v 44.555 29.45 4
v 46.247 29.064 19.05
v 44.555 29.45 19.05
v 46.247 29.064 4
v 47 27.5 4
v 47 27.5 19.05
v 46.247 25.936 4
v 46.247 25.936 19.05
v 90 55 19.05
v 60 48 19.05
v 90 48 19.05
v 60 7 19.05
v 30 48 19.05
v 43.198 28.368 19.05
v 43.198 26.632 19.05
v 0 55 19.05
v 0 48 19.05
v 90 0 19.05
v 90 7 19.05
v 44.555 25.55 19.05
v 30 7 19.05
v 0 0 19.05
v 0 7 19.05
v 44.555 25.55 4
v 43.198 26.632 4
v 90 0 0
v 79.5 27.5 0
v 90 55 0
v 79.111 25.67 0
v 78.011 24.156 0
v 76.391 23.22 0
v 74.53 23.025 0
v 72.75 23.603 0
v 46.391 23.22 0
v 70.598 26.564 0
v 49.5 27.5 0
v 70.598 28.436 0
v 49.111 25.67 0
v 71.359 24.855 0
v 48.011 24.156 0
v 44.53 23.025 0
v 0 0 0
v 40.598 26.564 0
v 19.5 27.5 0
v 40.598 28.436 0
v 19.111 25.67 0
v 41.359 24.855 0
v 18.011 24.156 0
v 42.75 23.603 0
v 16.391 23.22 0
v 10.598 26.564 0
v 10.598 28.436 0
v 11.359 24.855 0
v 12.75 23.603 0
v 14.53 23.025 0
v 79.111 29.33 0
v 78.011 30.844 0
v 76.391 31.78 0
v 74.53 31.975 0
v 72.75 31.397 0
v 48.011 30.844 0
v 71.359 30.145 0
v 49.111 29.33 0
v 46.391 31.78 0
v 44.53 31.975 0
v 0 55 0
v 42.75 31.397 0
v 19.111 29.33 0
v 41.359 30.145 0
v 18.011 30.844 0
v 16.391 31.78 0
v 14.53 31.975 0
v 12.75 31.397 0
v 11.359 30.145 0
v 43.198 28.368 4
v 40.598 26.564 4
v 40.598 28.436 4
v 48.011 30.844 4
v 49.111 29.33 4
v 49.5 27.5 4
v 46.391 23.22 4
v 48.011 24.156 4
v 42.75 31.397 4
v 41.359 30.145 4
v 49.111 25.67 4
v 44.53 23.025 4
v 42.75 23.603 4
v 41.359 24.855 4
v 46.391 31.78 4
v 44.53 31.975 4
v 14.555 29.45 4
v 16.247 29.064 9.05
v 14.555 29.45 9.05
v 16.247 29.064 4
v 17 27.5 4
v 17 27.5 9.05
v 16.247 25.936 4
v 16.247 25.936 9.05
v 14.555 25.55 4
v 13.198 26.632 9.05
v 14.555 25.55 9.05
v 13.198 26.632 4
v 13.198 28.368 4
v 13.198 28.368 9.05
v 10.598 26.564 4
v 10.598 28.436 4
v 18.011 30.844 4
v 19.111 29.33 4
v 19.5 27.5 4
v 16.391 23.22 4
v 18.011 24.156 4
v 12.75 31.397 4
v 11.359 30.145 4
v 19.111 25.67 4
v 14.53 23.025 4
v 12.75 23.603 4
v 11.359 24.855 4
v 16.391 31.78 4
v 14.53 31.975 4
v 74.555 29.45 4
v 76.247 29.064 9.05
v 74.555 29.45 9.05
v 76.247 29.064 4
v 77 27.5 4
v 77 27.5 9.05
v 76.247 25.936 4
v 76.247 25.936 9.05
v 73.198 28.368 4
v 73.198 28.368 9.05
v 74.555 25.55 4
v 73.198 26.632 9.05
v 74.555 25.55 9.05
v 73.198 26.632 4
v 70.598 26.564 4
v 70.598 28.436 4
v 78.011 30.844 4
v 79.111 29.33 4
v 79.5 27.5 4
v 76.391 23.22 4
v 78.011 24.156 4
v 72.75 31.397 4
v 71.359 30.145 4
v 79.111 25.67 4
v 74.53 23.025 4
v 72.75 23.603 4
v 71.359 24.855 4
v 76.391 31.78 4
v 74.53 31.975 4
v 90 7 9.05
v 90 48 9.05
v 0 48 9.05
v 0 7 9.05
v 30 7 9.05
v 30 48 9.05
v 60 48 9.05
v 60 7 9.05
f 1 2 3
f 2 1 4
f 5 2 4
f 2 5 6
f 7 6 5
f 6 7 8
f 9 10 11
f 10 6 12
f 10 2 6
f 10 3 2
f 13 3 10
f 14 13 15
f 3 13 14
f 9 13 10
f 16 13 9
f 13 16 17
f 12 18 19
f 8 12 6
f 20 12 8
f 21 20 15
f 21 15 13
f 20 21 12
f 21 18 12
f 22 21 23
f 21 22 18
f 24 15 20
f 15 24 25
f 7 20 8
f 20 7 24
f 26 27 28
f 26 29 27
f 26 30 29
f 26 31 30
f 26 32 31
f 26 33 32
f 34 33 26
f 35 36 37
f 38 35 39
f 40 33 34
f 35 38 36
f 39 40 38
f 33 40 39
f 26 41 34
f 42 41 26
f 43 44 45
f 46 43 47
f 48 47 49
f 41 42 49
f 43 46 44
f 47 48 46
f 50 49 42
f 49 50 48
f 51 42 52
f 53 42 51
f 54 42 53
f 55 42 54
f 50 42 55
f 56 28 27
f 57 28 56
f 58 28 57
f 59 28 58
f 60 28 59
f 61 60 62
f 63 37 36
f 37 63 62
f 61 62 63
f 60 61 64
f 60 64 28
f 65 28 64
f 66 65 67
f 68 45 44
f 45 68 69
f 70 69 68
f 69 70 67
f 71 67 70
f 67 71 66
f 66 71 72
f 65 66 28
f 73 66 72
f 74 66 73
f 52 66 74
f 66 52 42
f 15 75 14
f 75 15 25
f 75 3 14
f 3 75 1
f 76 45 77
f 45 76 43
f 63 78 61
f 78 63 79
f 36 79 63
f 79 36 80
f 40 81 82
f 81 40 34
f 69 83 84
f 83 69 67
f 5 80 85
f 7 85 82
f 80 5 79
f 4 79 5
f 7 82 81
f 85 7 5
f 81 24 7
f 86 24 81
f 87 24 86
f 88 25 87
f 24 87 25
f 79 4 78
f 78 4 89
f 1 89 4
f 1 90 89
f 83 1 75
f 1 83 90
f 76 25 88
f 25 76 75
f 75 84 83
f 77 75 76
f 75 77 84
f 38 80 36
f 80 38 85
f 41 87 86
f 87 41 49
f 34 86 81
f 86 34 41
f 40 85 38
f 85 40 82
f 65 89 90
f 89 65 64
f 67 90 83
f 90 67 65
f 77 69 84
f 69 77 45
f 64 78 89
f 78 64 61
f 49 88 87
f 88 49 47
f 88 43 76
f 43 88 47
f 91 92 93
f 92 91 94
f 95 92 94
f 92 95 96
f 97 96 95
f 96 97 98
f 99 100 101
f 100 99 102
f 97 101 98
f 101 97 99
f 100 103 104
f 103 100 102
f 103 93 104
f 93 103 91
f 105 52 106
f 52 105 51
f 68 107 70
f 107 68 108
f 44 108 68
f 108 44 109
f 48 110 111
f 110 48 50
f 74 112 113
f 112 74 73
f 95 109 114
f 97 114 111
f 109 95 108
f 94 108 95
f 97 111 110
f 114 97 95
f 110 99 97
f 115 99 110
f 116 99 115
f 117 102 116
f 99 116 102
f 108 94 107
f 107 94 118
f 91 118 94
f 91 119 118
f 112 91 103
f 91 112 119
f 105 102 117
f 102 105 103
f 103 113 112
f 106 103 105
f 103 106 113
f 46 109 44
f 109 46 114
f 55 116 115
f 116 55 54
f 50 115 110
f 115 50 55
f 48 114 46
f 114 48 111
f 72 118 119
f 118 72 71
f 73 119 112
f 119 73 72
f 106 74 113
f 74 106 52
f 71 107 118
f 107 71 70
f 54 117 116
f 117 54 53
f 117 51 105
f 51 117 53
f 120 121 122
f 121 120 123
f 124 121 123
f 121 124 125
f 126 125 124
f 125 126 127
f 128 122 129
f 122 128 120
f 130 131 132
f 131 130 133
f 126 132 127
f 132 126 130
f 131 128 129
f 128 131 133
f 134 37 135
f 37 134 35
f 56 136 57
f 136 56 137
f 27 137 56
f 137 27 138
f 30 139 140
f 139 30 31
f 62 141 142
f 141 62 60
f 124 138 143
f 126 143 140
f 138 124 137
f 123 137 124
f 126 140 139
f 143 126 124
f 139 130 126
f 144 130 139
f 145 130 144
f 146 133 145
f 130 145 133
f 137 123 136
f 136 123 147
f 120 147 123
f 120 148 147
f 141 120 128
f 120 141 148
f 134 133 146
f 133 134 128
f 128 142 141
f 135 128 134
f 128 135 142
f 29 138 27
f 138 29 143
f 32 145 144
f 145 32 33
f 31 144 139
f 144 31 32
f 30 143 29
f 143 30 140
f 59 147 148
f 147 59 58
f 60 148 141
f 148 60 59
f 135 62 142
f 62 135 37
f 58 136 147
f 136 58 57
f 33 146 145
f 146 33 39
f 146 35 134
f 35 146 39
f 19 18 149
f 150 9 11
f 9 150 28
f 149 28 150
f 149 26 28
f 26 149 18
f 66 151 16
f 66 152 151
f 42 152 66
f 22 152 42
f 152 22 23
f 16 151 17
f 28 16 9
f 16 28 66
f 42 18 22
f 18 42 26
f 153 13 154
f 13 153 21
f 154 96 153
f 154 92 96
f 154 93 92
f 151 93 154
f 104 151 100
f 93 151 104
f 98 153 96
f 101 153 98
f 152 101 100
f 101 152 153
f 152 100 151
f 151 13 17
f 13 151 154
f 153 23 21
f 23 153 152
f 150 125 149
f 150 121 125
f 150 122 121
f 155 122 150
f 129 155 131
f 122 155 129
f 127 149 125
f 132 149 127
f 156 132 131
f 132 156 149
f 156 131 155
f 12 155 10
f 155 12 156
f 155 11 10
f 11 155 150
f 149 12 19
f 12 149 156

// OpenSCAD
bracket_width = 275;
bracket_depth = 55;
bracket_thickness = 25.4 * 0.75;
honeycomb_hole_diameter = 5;
honeycomb_hole_upper_diameter = 10;
honeycomb_hole_upper_depth = 2;
honeycomb_spacings = [0, 93.5, 133.5, 227];
honeycomb_hole_y_offset = 33;

latch_width = 30;
latch_depth = 40;
latch_thickness = 10;
latch_lateral_play = 1;

drywall_hole_diameter = 4;
drywall_hole_lower_diameter = 9;
drywall_hole_lower_depth = 4;

module draw_full_bracket() {
    difference() {
        union() {
            // Left latch
            draw_latch();
            // Left mount
            translate([latch_width, 0, 0])
                draw_single_bracket();
            // Right latch
            translate([latch_width + bracket_width, 0, 0])
                draw_latch();
        }
        
        translate([latch_width / 2, bracket_depth / 2, 0]) {
            cylinder(h = bracket_thickness, d = drywall_hole_diameter);
            cylinder(h = drywall_hole_lower_depth, d = drywall_hole_lower_diameter);
        }
        
        translate([latch_width + bracket_width + latch_width / 2, bracket_depth / 2, 0]) {
            cylinder(h = bracket_thickness, d = drywall_hole_diameter);
            cylinder(h = drywall_hole_lower_depth, d = drywall_hole_lower_diameter);
        }
    }
}

module draw_left_bracket() {
    intersection() {
        draw_full_bracket();
        cube([(bracket_width / 2 + latch_width), bracket_depth, bracket_thickness]);
    }
}
module draw_right_bracket() {
    intersection() {
        draw_full_bracket();
        translate([(bracket_width / 2 + latch_width), 0, 0])
            cube([(bracket_width / 2 + latch_width), bracket_depth, bracket_thickness]);
    }
}

module draw_latch() {
    translate([0, (bracket_depth - latch_depth) / 2, bracket_thickness - latch_thickness])
        cube([latch_width, latch_depth, latch_thickness]);
}

module draw_latch_enclosure() {
    difference() {
        cube([latch_width * 2, bracket_depth, bracket_thickness]);
        
        translate([latch_width, latch_lateral_play / 2, 0])
            draw_latch();
        translate([latch_width, -latch_lateral_play / 2, 0])
            draw_latch();
        
        translate([latch_width / 2, bracket_depth / 2, 0]) {
            cylinder(h = bracket_thickness, d = drywall_hole_diameter);
            cylinder(h = drywall_hole_lower_depth, d = drywall_hole_lower_diameter);
        }
        
        translate([3 * latch_width / 2, bracket_depth / 2, 0]) {
            cylinder(h = bracket_thickness, d = drywall_hole_diameter);
            cylinder(h = drywall_hole_lower_depth, d = drywall_hole_lower_diameter);
        }
    }
}

module draw_latch_middle_enclosure() {
    difference() {
        cube([latch_width * 3, bracket_depth, bracket_thickness]);
        
        translate([0, latch_lateral_play / 2, 0])
            draw_latch();
        translate([0, -latch_lateral_play / 2, 0])
            draw_latch();
        
        translate([latch_width * 2, latch_lateral_play / 2, 0])
            draw_latch();
        translate([latch_width * 2, -latch_lateral_play / 2, 0])
            draw_latch();
        
        translate([latch_width * 3 / 2, bracket_depth / 2, 0]) {
            cylinder(h = bracket_thickness, d = drywall_hole_diameter);
            cylinder(h = drywall_hole_lower_depth, d = drywall_hole_lower_diameter);
        }
        
        translate([latch_width / 2, bracket_depth / 2, 0]) {
            cylinder(h = bracket_thickness, d = drywall_hole_diameter);
            cylinder(h = drywall_hole_lower_depth, d = drywall_hole_lower_diameter);
        }
        
        translate([5 * latch_width / 2, bracket_depth / 2, 0]) {
            cylinder(h = bracket_thickness, d = drywall_hole_diameter);
            cylinder(h = drywall_hole_lower_depth, d = drywall_hole_lower_diameter);
        }
    }
}

module draw_single_bracket() {
    difference() {
        cube([bracket_width, bracket_depth, bracket_thickness]);
        
        draw_holes(honeycomb_spacings);
    }
}

module draw_holes(spacings) {
    side_spacing = (bracket_width - max(spacings)) / 2;
    
    // Draw lowers
    for (x_offset = spacings) {
        translate([x_offset + honeycomb_hole_diameter / 2 + side_spacing, honeycomb_hole_y_offset, 0])
            cylinder(h = bracket_thickness, d = honeycomb_hole_diameter);
    }
    
    // Draw uppers
    for (x_offset = spacings) {
        translate([x_offset + honeycomb_hole_diameter / 2 + side_spacing, honeycomb_hole_y_offset, bracket_thickness - honeycomb_hole_upper_depth])
            cylinder(h = honeycomb_hole_upper_depth, d = honeycomb_hole_upper_diameter);
    }
}

//draw_left_bracket();
//draw_right_bracket();

//draw_full_bracket();
//draw_latch_enclosure();
draw_latch_middle_enclosure();
